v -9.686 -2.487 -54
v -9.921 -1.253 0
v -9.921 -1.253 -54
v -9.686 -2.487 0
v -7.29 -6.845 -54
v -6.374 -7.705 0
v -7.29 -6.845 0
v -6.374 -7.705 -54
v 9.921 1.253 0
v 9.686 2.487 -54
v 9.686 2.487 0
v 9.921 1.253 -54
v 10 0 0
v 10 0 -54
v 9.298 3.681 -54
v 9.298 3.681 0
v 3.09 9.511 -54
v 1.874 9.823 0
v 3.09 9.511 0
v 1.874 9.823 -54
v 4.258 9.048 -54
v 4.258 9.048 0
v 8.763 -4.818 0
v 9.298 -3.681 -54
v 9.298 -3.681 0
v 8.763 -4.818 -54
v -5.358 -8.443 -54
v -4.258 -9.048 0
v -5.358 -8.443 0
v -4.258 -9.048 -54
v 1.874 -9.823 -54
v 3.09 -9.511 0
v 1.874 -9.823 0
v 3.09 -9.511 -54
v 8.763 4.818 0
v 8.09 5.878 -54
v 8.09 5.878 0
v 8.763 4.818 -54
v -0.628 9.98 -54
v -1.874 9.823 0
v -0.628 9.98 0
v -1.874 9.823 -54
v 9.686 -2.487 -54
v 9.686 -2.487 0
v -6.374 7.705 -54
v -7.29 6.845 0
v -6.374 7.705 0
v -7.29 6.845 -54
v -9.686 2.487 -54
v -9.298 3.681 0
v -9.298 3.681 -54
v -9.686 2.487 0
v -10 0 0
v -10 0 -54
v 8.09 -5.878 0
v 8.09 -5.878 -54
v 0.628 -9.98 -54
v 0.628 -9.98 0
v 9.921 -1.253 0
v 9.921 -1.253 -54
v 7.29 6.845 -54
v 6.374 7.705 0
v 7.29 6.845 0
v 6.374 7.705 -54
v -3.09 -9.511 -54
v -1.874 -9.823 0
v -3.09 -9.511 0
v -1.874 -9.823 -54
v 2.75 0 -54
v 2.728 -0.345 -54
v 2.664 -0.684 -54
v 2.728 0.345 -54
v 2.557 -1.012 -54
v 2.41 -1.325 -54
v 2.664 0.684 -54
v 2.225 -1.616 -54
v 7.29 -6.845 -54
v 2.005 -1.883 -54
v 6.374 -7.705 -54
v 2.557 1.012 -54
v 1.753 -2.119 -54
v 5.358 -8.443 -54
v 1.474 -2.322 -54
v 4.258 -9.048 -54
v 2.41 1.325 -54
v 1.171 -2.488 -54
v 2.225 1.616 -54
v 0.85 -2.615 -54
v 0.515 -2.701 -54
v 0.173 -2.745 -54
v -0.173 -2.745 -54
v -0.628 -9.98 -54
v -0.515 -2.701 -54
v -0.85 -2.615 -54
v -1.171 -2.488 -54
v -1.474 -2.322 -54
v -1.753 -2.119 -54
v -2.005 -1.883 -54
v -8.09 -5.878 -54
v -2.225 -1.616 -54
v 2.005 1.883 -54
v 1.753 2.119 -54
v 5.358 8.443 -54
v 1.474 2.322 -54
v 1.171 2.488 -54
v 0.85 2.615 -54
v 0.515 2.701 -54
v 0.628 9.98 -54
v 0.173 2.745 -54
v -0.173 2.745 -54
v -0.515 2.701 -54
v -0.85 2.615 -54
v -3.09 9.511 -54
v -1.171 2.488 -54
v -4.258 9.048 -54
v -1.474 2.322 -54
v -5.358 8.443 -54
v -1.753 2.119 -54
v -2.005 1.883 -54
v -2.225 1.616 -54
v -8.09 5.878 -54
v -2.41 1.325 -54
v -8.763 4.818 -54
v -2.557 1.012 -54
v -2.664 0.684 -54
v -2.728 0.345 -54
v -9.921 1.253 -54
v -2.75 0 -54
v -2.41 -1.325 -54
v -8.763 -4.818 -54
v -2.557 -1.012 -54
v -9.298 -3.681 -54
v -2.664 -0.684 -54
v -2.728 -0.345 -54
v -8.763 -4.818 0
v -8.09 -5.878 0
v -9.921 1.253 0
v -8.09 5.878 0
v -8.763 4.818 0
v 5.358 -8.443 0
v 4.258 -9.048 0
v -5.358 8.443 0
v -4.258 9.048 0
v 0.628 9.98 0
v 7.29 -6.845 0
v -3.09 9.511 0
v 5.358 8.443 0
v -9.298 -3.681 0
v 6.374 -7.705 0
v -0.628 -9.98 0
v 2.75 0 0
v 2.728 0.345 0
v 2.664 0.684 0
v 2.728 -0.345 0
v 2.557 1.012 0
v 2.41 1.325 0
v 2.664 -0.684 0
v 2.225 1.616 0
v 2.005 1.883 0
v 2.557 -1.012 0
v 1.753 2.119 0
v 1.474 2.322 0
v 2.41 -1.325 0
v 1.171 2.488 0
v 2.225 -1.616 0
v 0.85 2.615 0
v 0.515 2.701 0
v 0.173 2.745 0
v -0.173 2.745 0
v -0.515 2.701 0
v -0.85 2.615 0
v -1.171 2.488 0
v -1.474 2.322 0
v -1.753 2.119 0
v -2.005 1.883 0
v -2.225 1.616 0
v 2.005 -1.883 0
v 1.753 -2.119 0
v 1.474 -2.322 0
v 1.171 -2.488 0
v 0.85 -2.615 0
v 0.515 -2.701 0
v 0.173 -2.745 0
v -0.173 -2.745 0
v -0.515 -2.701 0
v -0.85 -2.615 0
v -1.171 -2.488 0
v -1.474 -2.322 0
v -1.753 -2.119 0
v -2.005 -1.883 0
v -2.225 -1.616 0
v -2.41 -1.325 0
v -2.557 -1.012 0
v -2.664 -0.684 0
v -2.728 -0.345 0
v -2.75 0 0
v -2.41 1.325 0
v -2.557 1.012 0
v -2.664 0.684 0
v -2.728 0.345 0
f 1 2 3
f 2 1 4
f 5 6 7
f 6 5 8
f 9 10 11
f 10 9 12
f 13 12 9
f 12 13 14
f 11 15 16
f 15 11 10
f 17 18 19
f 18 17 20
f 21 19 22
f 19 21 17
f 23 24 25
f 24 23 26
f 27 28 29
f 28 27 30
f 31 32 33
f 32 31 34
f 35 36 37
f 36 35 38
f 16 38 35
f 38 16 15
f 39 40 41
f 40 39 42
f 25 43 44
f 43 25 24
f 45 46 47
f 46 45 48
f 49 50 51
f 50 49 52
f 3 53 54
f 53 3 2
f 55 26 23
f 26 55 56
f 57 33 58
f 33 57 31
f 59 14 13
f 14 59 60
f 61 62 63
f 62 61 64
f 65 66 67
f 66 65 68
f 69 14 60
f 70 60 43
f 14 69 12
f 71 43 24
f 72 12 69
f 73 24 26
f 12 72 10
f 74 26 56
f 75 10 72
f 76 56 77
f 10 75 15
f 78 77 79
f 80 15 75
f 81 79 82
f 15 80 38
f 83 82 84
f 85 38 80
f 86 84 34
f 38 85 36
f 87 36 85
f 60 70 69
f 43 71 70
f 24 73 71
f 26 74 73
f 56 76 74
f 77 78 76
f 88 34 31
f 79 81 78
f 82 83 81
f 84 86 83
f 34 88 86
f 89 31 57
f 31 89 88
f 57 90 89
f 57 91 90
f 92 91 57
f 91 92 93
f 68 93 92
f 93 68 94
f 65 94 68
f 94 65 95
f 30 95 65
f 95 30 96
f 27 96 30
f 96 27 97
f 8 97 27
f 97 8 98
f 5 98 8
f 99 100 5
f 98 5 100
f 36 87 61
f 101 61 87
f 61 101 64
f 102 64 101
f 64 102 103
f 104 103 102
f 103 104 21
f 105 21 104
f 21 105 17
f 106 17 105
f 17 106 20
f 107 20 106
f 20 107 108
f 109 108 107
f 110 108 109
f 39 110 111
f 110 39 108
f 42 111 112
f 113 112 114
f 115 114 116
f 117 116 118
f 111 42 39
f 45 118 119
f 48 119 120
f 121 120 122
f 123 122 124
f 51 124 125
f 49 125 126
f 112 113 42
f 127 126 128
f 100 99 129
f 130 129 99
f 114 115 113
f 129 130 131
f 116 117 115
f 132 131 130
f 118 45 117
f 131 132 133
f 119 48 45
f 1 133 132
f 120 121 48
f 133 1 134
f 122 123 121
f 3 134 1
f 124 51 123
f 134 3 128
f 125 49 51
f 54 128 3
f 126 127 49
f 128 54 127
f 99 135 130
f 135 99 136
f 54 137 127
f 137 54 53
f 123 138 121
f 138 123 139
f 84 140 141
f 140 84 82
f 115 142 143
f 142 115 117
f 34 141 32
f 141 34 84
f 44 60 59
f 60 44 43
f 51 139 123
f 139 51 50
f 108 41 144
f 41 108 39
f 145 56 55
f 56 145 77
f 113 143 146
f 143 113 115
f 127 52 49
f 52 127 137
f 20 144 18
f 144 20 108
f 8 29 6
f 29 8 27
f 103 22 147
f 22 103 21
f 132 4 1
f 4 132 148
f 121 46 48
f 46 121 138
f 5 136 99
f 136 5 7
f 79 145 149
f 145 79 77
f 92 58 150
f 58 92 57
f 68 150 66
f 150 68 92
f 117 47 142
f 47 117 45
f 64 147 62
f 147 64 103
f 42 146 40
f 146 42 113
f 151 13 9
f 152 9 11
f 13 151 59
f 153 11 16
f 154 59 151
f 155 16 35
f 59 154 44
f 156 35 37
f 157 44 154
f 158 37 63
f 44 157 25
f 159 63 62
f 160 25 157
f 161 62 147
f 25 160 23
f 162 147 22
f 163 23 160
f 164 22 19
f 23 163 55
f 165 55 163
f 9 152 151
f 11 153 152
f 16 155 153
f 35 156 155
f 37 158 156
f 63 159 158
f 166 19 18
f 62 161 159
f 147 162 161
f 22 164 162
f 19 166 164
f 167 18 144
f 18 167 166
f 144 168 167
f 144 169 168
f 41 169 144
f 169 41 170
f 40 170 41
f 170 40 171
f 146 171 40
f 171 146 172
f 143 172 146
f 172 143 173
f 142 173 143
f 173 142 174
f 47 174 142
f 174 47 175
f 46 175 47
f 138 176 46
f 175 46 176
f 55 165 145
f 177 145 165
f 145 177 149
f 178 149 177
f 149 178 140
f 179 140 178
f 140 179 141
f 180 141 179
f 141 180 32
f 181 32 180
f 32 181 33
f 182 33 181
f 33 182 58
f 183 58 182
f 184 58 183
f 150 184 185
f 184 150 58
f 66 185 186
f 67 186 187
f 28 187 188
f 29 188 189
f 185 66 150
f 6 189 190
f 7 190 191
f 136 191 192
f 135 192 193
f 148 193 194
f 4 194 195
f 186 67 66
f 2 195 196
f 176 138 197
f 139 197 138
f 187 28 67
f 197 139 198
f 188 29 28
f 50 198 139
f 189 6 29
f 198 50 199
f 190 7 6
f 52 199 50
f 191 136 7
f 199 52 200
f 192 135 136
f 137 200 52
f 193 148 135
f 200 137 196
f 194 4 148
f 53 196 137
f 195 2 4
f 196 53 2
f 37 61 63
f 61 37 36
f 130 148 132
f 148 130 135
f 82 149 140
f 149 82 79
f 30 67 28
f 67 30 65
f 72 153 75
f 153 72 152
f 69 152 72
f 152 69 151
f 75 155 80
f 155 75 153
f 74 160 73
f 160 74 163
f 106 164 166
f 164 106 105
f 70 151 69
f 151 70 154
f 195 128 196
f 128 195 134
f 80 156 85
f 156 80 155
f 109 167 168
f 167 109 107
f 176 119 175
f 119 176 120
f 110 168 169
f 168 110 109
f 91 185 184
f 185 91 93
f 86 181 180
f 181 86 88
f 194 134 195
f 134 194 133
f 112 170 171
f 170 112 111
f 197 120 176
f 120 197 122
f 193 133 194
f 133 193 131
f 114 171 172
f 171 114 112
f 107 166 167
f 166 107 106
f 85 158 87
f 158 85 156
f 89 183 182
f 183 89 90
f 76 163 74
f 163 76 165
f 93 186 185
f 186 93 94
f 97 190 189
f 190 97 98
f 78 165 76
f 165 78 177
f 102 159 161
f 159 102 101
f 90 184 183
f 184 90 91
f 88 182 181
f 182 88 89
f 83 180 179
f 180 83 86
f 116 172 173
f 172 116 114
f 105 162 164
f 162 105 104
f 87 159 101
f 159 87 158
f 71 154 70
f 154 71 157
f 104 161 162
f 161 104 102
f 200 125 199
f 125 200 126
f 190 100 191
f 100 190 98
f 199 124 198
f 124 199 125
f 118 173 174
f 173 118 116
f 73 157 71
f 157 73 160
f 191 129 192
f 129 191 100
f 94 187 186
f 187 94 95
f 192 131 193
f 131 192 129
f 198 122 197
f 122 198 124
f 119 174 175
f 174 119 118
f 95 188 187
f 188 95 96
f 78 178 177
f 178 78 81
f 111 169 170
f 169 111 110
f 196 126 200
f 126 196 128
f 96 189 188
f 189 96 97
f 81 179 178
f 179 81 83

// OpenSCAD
$fn = 50;


difference() {
	union() {
		translate(v = [0, 0, -54.0000000000]) {
			cylinder(h = 54, r = 10.0000000000);
		}
		cylinder(h = 0, r = 19.0000000000);
	}
	union() {
		#translate(v = [0, 0, -54]) {
			cylinder(h = 54, r = 2.7500000000);
		}
	}
}
